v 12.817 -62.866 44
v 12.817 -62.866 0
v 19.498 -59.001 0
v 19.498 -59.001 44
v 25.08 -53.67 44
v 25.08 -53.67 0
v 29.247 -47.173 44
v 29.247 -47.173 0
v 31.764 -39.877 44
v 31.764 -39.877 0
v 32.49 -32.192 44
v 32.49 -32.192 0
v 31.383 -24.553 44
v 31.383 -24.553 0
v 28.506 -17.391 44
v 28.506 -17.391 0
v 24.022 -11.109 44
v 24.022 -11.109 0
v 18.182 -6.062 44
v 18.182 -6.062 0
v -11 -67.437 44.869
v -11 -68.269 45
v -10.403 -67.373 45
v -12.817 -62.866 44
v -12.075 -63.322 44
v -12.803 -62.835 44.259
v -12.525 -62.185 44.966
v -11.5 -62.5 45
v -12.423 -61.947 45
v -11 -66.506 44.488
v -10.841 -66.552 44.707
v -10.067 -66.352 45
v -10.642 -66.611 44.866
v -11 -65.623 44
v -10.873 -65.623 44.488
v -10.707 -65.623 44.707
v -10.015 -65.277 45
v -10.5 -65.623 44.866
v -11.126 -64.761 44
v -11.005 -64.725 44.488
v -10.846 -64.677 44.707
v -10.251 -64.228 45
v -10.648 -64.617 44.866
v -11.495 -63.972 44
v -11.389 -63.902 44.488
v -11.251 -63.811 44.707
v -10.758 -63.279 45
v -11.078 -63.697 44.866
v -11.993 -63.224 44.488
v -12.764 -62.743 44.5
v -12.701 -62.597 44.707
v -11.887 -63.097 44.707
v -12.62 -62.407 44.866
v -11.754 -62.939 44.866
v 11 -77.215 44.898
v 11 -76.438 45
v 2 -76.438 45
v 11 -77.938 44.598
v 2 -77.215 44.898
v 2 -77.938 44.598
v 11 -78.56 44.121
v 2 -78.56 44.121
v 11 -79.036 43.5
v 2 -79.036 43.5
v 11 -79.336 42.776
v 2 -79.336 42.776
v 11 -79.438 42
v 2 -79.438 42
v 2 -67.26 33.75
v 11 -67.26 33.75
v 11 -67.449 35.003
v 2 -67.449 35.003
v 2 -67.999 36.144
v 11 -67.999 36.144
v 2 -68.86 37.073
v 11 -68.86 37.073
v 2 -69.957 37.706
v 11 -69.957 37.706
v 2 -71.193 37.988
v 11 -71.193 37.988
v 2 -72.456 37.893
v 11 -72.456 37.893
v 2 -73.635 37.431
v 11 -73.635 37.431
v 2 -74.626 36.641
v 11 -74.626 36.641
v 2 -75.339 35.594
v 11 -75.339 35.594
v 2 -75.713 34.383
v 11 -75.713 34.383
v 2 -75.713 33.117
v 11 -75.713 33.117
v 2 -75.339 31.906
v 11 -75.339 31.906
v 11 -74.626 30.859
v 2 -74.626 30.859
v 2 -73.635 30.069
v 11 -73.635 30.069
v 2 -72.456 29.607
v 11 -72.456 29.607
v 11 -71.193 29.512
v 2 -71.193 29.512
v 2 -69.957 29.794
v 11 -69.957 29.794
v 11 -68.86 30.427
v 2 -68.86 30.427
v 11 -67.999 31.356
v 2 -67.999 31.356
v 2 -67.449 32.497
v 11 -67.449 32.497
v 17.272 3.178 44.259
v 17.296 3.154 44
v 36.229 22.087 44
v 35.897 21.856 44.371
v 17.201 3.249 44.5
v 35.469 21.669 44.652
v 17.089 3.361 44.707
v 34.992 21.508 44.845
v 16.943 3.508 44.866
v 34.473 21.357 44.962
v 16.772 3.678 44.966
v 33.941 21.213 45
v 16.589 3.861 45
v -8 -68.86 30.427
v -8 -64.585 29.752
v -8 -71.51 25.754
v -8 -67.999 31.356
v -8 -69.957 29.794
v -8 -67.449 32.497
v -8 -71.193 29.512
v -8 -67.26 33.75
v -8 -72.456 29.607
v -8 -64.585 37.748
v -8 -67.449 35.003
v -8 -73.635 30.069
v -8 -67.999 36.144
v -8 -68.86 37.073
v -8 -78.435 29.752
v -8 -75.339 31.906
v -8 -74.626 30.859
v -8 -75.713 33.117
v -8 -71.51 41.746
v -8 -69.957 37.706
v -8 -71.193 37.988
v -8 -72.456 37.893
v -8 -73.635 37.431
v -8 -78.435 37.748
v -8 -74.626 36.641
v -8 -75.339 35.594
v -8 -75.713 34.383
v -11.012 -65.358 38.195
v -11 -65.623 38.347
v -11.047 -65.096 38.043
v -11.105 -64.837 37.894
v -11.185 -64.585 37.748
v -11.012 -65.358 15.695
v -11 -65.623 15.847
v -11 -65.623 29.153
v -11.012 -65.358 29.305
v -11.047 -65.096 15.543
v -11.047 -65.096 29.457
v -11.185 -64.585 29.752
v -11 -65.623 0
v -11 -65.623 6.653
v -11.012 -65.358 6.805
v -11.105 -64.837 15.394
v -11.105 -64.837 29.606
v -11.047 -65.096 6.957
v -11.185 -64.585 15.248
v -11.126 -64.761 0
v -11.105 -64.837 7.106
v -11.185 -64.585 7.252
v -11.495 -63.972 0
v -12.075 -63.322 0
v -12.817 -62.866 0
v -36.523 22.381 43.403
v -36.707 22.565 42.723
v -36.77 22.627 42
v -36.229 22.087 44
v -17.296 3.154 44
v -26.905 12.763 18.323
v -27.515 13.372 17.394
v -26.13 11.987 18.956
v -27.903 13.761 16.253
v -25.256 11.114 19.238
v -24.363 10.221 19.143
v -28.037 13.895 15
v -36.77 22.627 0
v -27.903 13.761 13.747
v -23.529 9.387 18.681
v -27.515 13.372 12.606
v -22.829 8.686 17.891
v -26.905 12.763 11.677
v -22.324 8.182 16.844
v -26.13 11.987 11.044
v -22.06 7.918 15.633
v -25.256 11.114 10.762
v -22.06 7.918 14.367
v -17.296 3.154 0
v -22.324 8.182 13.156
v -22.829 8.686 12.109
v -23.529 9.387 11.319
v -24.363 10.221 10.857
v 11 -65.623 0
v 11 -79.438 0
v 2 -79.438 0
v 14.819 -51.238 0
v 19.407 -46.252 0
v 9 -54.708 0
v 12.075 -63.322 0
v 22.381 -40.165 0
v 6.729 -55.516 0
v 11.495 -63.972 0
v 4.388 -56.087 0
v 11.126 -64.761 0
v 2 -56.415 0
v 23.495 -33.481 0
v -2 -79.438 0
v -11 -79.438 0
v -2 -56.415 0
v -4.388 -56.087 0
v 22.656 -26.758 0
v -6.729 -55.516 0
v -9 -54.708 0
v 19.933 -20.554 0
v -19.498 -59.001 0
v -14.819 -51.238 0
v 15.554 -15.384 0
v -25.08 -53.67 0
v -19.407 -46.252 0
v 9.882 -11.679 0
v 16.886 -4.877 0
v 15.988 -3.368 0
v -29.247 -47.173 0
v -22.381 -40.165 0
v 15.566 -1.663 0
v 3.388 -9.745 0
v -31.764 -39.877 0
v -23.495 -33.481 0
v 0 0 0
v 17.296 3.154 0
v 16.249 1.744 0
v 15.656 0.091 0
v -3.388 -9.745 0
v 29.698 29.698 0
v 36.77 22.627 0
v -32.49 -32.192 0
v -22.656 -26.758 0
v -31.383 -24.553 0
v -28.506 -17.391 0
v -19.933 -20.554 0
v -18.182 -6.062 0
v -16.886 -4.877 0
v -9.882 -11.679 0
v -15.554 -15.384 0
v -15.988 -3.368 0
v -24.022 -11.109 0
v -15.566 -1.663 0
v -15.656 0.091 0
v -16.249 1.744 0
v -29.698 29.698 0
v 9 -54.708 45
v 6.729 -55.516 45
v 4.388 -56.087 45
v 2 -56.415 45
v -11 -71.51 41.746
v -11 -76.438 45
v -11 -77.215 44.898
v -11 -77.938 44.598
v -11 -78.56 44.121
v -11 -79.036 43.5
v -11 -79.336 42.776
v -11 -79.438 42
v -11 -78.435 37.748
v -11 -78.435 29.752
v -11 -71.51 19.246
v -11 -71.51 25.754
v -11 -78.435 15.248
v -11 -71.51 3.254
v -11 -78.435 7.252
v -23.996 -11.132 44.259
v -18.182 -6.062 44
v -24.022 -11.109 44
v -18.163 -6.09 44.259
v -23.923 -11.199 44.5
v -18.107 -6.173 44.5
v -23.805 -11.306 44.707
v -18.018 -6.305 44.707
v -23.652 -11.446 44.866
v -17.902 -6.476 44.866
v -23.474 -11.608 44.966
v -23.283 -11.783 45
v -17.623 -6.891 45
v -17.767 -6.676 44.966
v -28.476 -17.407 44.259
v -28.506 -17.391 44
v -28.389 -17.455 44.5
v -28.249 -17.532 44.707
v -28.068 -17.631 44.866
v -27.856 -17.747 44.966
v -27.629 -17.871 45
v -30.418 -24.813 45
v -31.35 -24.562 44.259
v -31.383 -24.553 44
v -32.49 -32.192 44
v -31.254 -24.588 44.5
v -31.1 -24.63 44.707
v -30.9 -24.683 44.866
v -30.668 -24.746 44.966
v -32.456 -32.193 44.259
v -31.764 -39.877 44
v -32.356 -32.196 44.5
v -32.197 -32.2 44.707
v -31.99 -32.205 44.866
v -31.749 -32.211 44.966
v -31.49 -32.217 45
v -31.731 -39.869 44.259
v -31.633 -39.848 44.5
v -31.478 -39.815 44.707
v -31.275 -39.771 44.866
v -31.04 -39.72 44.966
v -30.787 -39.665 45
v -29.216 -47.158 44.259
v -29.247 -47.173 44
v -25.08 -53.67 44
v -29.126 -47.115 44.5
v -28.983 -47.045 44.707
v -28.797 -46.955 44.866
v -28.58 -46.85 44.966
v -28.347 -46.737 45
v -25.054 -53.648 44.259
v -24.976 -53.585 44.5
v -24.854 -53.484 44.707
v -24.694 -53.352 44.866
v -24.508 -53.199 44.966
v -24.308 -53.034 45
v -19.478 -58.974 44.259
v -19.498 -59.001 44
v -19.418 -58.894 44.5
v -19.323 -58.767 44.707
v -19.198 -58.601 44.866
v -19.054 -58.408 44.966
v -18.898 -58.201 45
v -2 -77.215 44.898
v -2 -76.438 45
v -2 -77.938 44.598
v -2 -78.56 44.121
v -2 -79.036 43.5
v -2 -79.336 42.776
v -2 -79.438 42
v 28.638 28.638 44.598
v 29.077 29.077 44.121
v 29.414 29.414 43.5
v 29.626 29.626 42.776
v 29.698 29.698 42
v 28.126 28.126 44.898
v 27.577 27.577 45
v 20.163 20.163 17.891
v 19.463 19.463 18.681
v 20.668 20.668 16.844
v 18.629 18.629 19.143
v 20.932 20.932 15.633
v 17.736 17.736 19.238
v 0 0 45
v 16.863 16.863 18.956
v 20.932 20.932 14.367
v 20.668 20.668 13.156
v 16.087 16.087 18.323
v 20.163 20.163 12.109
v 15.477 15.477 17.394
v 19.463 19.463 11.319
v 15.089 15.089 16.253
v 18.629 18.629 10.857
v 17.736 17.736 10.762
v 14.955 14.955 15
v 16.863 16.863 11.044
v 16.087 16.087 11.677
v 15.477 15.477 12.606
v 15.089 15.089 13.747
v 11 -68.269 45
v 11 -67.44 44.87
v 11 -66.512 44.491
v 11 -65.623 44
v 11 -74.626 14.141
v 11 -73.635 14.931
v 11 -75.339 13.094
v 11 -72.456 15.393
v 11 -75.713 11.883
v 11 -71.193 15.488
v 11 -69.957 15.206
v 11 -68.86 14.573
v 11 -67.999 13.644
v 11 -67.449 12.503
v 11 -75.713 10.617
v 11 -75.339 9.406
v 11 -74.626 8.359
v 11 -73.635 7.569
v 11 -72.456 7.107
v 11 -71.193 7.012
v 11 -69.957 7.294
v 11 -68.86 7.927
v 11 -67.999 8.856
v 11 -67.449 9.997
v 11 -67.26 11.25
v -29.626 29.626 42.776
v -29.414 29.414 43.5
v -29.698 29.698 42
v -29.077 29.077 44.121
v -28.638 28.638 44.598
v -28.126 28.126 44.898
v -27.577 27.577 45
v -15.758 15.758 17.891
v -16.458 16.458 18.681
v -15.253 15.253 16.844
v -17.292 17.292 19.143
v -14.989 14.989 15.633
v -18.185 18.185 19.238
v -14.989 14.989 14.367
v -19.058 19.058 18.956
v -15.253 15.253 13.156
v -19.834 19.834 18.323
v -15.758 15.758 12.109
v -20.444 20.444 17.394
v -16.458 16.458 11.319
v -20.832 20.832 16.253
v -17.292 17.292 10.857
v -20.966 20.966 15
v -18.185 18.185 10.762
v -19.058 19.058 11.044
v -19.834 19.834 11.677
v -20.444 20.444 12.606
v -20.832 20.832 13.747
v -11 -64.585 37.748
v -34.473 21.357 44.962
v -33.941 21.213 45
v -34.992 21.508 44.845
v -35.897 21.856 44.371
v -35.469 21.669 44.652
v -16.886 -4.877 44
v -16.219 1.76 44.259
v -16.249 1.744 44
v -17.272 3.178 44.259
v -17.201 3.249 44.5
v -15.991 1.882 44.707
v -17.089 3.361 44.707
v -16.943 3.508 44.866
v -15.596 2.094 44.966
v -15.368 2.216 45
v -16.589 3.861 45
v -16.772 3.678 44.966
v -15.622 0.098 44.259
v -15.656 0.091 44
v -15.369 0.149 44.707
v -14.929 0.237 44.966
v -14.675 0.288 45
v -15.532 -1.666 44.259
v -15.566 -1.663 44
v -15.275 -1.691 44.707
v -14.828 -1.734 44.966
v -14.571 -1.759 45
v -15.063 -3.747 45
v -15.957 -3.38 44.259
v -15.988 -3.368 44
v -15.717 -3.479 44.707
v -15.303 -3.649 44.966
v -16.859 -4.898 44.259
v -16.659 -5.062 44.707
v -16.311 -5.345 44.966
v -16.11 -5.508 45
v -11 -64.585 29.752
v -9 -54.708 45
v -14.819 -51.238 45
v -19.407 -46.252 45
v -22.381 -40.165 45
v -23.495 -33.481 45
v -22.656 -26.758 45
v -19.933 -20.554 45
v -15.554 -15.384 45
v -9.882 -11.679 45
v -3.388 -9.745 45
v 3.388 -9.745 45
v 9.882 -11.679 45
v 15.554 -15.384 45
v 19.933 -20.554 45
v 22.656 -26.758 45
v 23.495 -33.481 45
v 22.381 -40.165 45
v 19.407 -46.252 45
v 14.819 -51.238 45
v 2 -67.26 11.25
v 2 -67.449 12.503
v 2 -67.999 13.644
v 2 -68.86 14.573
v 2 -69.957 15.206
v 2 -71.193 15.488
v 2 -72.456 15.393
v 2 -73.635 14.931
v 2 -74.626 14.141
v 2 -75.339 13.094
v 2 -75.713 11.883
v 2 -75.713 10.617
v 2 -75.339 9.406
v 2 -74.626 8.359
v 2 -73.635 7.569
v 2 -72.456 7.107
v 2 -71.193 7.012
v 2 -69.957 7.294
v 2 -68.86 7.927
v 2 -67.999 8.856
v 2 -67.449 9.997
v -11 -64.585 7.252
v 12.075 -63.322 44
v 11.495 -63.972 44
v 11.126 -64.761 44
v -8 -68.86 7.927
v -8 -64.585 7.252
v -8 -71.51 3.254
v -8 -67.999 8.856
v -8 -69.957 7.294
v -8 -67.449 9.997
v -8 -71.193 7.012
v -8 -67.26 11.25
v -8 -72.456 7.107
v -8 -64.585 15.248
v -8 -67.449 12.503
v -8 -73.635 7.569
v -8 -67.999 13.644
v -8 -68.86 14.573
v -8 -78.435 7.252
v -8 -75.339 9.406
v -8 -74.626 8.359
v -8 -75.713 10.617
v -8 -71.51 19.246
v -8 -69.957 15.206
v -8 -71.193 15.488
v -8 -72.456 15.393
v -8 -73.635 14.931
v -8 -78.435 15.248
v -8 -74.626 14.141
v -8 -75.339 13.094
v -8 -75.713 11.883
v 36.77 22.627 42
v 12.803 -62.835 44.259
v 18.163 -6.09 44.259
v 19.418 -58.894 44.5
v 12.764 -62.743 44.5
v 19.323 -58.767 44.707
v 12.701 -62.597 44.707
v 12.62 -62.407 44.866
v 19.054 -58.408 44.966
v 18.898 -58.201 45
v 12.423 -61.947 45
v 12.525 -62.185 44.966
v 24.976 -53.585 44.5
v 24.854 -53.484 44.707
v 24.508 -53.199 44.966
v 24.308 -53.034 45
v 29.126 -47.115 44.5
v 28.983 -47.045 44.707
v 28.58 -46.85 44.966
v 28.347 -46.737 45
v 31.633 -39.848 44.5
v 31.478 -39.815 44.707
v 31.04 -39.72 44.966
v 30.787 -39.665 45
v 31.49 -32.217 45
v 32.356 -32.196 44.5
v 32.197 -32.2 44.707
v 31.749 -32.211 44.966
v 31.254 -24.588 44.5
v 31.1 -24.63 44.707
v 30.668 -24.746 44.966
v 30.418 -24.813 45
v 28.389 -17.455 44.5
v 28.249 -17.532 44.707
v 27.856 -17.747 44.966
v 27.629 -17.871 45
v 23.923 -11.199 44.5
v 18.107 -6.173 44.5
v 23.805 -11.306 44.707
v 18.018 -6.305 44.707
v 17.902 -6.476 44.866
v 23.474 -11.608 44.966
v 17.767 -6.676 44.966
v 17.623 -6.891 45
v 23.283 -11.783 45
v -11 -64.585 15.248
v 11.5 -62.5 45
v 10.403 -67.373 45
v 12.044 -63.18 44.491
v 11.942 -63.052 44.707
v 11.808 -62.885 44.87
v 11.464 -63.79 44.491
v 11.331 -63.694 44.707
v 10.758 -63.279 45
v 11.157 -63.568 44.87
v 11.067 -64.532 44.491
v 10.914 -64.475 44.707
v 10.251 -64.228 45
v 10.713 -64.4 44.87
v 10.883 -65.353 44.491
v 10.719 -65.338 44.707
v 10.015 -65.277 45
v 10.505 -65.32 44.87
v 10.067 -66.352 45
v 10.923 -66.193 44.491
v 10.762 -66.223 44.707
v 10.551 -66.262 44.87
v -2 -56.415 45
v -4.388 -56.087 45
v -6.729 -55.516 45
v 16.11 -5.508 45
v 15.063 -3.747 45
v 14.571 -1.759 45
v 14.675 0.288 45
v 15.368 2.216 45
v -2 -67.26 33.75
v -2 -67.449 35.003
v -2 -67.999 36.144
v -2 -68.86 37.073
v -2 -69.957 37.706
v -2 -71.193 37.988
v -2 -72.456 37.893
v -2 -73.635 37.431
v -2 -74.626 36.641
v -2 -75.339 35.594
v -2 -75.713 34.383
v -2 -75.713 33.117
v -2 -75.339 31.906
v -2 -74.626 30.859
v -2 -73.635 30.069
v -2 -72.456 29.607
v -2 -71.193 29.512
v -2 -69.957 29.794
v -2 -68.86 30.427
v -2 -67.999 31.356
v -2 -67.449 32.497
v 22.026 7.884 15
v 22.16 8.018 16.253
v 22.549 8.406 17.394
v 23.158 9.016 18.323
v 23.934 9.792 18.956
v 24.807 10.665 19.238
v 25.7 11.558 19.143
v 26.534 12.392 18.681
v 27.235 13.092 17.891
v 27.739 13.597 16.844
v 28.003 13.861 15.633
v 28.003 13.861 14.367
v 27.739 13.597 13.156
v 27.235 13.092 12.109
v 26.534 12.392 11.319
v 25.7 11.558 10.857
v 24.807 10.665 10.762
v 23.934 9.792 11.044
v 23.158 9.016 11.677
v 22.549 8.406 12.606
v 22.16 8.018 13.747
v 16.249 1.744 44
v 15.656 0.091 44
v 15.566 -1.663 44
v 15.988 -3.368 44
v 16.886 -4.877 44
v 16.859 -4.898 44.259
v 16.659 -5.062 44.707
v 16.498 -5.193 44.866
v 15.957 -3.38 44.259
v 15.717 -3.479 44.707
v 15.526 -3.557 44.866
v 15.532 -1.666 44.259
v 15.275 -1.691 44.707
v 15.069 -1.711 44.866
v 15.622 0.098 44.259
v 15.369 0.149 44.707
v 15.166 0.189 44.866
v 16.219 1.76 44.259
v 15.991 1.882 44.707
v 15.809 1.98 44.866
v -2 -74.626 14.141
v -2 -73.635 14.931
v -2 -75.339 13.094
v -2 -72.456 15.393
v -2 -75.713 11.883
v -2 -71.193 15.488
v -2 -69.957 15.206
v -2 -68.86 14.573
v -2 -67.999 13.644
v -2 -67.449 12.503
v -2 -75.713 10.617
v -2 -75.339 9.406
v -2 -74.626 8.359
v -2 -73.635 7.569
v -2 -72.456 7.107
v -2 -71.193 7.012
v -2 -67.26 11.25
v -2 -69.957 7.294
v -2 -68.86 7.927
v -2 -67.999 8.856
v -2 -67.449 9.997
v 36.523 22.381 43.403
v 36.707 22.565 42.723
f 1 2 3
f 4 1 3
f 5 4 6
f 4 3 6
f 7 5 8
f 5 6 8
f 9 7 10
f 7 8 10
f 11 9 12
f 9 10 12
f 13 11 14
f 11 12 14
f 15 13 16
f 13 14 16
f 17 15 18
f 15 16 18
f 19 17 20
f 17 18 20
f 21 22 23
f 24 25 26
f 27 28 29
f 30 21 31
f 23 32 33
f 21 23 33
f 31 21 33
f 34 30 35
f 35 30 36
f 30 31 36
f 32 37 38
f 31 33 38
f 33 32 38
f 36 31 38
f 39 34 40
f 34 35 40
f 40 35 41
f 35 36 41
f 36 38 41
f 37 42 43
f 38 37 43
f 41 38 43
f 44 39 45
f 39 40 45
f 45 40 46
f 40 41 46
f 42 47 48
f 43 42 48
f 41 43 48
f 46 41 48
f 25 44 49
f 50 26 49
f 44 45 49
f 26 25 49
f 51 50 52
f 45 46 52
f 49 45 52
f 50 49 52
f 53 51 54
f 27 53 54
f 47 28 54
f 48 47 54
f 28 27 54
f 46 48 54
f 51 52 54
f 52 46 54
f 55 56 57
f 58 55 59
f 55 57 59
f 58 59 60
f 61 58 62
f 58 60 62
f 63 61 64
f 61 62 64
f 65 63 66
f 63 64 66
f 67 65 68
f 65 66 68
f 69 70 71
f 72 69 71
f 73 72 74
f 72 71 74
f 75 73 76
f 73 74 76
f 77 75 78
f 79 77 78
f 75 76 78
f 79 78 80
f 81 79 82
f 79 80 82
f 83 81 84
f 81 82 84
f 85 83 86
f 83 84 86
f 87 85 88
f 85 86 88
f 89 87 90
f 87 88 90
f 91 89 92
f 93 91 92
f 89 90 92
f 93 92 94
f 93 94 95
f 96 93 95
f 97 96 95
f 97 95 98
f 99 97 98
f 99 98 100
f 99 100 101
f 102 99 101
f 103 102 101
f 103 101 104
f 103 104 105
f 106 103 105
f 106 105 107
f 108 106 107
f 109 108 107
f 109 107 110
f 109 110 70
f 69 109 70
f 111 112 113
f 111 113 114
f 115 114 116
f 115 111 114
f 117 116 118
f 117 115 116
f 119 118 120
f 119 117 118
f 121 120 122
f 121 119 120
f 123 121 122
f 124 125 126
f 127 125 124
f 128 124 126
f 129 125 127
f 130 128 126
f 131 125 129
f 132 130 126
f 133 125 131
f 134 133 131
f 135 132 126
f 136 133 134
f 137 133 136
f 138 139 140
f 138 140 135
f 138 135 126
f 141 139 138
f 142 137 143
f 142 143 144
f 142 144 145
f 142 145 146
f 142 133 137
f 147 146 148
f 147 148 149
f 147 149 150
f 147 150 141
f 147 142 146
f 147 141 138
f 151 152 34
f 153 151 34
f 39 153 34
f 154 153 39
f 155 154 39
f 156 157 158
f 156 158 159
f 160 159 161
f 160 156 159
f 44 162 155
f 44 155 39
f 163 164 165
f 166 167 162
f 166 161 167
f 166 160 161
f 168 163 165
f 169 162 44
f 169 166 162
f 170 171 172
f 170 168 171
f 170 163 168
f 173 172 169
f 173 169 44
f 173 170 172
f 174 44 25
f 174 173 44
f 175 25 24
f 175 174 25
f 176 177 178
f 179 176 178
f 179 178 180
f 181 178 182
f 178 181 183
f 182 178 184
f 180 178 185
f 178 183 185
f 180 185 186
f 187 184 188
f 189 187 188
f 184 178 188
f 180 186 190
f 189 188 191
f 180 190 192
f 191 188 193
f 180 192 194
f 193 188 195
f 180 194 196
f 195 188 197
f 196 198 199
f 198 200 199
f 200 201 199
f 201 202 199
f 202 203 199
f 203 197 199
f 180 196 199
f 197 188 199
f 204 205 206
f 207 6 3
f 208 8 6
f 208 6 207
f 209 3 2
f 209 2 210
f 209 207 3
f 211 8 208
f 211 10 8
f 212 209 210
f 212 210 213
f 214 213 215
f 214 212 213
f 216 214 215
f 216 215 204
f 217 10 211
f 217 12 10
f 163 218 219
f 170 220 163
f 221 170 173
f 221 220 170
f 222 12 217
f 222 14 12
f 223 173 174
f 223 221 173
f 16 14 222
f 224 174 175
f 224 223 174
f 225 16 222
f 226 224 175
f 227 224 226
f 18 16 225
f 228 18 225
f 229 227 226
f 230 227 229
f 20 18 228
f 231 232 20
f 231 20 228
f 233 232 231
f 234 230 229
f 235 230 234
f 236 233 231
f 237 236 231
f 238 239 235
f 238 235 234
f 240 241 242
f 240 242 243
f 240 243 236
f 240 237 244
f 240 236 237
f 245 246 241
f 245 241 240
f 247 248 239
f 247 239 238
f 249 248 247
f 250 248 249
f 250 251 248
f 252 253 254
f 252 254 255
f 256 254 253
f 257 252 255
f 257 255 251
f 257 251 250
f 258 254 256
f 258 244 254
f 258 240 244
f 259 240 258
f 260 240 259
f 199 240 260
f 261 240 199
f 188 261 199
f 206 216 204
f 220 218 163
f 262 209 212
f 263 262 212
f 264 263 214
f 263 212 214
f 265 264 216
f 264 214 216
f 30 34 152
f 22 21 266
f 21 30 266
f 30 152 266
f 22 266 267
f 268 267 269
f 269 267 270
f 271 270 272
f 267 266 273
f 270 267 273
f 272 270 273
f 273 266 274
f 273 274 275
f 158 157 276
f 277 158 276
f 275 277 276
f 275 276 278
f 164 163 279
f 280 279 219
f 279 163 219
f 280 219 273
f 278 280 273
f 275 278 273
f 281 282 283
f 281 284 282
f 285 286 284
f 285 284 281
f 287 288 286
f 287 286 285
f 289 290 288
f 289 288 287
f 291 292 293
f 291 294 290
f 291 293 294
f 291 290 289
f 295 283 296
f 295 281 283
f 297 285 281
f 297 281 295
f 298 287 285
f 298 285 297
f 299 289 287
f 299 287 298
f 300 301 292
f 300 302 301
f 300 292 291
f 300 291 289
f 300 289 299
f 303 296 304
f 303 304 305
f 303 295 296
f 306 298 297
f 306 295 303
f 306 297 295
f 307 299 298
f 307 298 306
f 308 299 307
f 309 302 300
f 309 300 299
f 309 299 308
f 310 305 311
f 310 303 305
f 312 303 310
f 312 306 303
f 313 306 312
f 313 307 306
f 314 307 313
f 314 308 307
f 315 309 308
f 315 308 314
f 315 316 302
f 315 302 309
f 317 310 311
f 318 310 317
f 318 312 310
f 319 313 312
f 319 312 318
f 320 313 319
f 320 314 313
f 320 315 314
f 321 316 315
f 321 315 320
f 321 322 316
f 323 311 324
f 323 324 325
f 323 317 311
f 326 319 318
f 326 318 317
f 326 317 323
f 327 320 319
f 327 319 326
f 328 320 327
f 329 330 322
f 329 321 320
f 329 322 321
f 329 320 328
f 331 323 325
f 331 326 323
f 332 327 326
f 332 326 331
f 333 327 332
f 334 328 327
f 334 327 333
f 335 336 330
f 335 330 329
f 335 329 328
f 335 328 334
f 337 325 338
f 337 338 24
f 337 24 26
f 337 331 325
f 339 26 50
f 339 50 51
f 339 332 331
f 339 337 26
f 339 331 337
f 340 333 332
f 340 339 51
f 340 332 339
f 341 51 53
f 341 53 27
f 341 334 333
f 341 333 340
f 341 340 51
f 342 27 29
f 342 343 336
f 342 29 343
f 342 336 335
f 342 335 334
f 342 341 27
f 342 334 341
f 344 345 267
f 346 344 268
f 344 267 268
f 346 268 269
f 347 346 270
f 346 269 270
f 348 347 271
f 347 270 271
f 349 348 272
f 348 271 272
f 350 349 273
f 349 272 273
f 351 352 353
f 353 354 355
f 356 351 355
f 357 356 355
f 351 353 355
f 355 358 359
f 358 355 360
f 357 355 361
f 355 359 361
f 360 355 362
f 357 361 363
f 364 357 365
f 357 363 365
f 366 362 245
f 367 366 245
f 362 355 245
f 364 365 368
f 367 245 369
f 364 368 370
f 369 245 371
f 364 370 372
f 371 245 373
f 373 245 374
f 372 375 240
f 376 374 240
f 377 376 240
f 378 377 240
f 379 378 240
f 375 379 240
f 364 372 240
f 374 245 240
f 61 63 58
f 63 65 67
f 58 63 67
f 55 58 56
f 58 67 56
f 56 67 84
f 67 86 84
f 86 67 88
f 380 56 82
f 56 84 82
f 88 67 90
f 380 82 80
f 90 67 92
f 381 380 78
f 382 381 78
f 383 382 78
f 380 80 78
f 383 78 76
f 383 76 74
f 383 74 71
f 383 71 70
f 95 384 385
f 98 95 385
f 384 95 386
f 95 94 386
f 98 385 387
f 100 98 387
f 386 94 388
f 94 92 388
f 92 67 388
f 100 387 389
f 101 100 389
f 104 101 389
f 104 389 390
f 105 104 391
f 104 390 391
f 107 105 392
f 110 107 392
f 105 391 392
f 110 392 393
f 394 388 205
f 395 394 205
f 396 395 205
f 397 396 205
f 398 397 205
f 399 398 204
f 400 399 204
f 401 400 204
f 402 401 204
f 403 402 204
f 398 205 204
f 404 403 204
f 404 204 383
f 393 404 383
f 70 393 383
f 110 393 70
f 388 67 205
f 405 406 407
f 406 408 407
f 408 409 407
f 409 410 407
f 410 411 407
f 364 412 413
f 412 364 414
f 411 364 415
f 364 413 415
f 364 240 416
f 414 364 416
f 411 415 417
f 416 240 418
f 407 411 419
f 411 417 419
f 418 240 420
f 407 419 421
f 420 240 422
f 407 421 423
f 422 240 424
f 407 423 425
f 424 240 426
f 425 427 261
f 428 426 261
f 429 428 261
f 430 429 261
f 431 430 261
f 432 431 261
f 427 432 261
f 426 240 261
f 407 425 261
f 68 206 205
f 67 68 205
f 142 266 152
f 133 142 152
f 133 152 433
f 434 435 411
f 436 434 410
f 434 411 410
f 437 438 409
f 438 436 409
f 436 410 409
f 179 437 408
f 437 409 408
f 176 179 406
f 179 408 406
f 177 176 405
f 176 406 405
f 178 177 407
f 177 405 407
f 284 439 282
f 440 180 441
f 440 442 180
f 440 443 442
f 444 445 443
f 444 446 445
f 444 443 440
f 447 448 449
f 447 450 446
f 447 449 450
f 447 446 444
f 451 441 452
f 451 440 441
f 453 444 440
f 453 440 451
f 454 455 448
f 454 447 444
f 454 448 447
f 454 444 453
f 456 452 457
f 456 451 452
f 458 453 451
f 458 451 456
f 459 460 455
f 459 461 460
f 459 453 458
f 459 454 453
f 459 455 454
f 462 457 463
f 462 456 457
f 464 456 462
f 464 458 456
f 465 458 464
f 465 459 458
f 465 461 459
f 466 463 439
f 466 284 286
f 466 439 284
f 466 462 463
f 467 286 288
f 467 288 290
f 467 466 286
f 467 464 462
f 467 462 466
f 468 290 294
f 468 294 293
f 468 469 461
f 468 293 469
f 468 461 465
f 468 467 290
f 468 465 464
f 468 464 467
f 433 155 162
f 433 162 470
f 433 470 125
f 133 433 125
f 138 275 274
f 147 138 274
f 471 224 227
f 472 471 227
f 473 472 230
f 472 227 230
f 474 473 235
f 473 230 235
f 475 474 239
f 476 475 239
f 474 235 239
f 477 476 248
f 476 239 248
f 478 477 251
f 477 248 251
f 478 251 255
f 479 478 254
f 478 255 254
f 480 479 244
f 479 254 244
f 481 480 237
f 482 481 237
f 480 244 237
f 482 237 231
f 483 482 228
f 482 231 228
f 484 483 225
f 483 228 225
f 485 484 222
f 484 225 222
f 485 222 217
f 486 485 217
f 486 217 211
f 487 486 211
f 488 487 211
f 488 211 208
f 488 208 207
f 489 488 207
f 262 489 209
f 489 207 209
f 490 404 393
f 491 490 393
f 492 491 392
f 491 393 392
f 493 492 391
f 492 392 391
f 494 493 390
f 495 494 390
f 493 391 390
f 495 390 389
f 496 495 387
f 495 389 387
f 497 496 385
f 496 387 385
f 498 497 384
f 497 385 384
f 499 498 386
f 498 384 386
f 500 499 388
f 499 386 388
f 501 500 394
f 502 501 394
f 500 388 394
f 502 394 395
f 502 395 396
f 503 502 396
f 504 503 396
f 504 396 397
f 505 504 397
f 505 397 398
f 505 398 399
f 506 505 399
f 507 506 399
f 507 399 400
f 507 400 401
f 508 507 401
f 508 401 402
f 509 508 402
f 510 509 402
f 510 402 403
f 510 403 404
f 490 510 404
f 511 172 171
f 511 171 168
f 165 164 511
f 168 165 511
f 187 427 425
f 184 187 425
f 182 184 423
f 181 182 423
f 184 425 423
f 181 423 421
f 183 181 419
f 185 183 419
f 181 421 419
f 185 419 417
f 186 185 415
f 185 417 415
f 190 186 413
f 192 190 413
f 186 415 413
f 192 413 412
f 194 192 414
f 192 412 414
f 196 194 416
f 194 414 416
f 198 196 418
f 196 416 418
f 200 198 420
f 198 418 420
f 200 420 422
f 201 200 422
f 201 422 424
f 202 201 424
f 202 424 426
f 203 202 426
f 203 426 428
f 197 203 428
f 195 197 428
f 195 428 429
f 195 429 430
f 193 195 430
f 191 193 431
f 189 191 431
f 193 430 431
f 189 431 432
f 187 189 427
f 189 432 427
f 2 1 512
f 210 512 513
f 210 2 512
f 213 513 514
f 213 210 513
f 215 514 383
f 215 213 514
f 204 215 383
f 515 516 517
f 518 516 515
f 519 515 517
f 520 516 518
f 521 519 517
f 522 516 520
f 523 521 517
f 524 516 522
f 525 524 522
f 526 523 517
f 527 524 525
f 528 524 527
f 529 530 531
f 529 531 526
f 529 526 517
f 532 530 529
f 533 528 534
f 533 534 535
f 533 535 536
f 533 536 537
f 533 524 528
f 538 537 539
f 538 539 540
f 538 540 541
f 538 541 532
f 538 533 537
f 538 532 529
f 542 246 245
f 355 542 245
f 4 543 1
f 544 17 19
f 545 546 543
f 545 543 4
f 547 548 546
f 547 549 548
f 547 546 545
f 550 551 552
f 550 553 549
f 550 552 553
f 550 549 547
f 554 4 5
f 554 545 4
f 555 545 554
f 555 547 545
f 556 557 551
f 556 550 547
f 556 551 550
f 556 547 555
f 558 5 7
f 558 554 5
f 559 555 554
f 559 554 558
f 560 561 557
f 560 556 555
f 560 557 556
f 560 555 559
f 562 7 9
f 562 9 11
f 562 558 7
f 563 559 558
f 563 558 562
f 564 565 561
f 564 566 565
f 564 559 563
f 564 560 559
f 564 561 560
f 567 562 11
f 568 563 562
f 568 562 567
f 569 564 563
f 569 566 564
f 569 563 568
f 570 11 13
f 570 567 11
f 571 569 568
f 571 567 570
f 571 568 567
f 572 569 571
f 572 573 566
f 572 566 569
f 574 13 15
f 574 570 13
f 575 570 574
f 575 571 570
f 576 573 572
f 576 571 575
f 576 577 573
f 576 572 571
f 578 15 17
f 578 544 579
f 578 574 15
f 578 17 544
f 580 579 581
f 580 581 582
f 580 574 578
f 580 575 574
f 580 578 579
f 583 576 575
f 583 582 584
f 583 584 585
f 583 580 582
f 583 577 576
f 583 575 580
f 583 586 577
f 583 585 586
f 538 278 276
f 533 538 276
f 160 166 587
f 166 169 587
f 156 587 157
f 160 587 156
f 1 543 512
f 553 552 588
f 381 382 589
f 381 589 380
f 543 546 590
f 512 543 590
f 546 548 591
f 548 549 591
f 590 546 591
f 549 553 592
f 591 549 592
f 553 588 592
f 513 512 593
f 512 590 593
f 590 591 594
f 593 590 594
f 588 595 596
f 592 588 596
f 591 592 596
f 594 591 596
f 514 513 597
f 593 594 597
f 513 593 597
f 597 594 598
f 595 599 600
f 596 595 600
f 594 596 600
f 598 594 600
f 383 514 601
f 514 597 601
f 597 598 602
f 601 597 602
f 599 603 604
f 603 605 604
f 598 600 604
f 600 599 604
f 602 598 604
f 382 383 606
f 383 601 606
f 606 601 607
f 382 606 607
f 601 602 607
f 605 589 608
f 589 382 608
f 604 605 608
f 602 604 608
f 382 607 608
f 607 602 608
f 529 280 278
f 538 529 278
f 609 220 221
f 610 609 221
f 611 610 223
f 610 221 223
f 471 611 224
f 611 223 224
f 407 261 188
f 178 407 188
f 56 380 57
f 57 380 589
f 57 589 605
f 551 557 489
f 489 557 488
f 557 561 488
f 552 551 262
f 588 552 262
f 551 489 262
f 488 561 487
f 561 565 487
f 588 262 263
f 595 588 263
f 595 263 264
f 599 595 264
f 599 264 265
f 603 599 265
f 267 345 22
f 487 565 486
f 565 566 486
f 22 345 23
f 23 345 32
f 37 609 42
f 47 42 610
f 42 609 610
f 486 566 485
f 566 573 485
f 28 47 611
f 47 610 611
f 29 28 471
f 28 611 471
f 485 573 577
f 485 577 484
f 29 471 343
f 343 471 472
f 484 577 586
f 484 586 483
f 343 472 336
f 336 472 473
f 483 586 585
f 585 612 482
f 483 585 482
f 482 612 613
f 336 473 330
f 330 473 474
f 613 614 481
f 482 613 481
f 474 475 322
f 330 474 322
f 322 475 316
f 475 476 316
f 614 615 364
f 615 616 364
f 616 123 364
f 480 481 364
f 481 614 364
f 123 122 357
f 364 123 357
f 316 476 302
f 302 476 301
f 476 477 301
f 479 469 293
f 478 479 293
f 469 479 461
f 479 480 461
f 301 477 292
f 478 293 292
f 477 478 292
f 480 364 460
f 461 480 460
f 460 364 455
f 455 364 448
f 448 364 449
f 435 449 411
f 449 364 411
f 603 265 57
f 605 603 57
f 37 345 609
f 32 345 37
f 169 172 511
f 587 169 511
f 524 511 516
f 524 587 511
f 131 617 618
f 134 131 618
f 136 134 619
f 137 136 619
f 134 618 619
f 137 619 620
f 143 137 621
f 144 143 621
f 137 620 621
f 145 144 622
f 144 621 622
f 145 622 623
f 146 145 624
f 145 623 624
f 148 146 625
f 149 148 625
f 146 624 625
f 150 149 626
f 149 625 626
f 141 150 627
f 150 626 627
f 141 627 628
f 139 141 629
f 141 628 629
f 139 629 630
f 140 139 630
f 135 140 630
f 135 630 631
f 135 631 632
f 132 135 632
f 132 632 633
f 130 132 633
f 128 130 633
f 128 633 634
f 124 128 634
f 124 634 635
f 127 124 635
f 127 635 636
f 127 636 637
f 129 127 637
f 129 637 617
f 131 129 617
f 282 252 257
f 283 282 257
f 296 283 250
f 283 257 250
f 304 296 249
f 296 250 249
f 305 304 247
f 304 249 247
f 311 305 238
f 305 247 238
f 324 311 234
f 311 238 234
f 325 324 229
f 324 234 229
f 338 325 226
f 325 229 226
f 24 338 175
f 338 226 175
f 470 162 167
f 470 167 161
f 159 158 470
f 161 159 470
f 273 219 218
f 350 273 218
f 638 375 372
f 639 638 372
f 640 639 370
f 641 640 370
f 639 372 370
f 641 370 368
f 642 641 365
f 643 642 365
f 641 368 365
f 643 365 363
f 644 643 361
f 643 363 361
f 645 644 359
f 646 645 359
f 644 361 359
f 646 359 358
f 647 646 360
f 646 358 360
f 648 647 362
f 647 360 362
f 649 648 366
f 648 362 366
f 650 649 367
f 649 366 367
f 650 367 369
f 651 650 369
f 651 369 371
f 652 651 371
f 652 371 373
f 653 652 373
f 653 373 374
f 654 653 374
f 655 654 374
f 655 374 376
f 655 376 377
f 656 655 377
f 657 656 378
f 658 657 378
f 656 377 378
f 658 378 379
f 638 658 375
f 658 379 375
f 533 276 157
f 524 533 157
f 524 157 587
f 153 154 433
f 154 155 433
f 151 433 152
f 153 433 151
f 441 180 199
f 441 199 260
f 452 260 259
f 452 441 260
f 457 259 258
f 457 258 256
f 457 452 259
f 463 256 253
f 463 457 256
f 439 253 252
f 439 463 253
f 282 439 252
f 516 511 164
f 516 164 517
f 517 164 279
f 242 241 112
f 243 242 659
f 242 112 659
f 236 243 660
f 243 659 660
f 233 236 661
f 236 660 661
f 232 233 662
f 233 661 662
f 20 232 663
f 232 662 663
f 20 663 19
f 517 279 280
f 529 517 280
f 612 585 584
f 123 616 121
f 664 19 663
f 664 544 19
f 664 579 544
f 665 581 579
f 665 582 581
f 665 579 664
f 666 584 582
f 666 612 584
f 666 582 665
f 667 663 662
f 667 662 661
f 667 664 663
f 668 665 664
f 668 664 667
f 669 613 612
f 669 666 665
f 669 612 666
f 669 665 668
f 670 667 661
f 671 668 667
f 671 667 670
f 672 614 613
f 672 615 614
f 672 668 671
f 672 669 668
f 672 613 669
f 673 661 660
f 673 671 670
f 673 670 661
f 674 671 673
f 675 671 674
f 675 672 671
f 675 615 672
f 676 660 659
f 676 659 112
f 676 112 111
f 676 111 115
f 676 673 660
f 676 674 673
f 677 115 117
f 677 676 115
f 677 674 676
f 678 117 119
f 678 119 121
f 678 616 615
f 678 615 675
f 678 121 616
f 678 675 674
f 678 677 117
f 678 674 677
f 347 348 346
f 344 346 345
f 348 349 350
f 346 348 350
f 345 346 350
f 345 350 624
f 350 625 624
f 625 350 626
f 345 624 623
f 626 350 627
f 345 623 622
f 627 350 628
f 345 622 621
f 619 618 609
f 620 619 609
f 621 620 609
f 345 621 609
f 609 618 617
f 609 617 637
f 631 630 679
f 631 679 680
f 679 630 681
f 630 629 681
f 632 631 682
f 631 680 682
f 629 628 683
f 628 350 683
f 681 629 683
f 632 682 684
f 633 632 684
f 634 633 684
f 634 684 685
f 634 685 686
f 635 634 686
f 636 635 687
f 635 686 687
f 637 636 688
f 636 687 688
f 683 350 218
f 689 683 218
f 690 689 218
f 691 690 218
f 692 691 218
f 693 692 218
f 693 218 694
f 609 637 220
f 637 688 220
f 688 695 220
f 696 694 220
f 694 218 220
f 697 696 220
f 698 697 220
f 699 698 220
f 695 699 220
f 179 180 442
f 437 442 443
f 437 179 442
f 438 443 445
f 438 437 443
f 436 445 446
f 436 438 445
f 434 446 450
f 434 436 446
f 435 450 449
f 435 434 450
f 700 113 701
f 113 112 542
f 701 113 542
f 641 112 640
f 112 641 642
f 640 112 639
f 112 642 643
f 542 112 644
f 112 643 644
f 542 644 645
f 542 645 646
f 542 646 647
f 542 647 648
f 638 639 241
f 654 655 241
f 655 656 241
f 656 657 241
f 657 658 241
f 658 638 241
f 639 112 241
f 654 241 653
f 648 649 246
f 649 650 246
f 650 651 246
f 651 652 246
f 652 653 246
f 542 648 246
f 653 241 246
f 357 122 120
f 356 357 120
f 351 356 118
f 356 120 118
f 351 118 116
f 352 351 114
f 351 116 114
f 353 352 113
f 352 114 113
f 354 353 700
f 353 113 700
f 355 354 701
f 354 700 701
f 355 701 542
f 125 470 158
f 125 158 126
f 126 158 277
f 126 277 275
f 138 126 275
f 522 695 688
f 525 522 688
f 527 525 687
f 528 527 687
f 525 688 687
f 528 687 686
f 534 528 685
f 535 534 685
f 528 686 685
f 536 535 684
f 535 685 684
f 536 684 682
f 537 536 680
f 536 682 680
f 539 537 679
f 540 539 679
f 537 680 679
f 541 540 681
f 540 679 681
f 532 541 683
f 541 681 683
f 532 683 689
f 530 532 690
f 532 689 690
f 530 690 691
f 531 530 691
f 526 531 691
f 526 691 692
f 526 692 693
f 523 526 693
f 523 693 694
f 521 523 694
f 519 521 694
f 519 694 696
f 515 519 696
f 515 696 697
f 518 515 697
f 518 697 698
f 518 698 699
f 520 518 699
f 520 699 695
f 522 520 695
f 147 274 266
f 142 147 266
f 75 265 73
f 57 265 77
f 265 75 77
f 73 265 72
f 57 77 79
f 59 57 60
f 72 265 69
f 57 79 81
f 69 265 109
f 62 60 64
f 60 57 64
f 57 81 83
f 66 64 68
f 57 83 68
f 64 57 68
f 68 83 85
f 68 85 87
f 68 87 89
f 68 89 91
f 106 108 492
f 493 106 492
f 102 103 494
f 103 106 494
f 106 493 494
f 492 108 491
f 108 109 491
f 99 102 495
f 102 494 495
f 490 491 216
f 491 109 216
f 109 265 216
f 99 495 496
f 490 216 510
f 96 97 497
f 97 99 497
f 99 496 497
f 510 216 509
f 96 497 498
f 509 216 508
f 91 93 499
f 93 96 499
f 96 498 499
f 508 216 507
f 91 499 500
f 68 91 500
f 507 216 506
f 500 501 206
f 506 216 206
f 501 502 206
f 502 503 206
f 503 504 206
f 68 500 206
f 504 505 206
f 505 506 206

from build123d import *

# Parameters (mm, degrees)
F1_DEPTH      = 45
F2_R          = 4.25
F3_DEPTH      = 10
F4_R          = 4.25
F5_DEPTH      = 10
F6_R          = 4.25
F7_DEPTH      = 22
F9_DEPTH      = 3
F10_R         = 6
F11_T1_DEPTH  = 45
F11_T6_DEPTH  = 50.1024684741
F11_T11_DEPTH = 50.1024684741
F11_T17_DEPTH = 55.2049369483
F11_T23_DEPTH = 50.1024684741
F11_T25_DEPTH = 24
F11_T27_DEPTH = 24
F11_T29_DEPTH = 25
F11_T31_DEPTH = 25
F12_T3_ANGLE  = 122.7559288298
F12_T6_ANGLE  = 114.5305881861
F12_T9_ANGLE  = 100.9823800972
F12_T12_DEPTH = 27.0396198775
F12_T15_DEPTH = 27.0396198775
F12_T18_ANGLE = 100.9823800972
F12_T21_ANGLE = 114.5305881861
F12_T24_ANGLE = 122.7559288298


# Not quite as in the source:
# - a fillet or chamfer that OpenCascade refuses, or shapes differently, is made with other operations: its cross-section is extruded or revolved along the edge and cut away or added


with BuildPart() as f1:
    # F0 (on Top) → F1 (new body)
    with BuildSketch(Plane.XY):
        with BuildLine():
            Line((29.6984848098, 29.6984848098), (0, 0))
            Line((0, 0), (-29.6984848098, 29.6984848098))
            Line((-29.6984848098, 29.6984848098), (-36.7695526217, 22.627416998))
            Line((-36.7695526217, 22.627416998), (-11.5286496808, -2.613485943))
            ThreePointArc((-11.5286496808, -2.613485943), (-32.4987783251, -33.2817931394), (-11, -63.5818573667))
            ThreePointArc((-11, -63.5818573667), (-8.6210949019, -64.3357100238), (-6.1913611889, -64.9048122801))
            Line((-6.1913611889, -64.9048122801), (-9, -54.7082933461))
            ThreePointArc((-9, -54.7082933461), (0, -9.5), (9, -54.7082933461))
            Line((9, -54.7082933461), (6.1913611889, -64.9048122801))
            ThreePointArc((6.1913611889, -64.9048122801), (8.6210949019, -64.3357100238), (11, -63.5818573667))
            ThreePointArc((11, -63.5818573667), (32.4987783251, -33.2817931394), (11.5286496808, -2.613485943))
            Line((11.5286496808, -2.613485943), (36.7695526217, 22.627416998))
            Line((36.7695526217, 22.627416998), (29.6984848098, 29.6984848098))
        make_face()
        with BuildLine():
            ThreePointArc((-6.1913611889, -64.9048122801), (-8.6210949019, -64.3357100238), (-11, -63.5818573667))
            Line((-11, -63.5818573667), (-11, -79.4384031666))
            Line((-11, -79.4384031666), (-2, -79.4384031666))
            Line((-2, -79.4384031666), (-2, -67.4147389479))
            Line((-2, -67.4147389479), (-5.5, -67.4147389479))
            Line((-5.5, -67.4147389479), (-6.1913611889, -64.9048122801))
        make_face()
        with BuildLine():
            Line((11, -79.4384031666), (11, -63.5818573667))
            ThreePointArc((11, -63.5818573667), (8.6210949019, -64.3357100238), (6.1913611889, -64.9048122801))
            Line((6.1913611889, -64.9048122801), (5.5, -67.4147389479))
            Line((5.5, -67.4147389479), (2, -67.4147389479))
            Line((2, -67.4147389479), (2, -79.4384031666))
            Line((2, -79.4384031666), (11, -79.4384031666))
        make_face()
        with BuildLine():
            Line((-9, -54.7082933461), (-6.1913611889, -64.9048122801))
            ThreePointArc((-6.1913611889, -64.9048122801), (-4.1043610148, -65.2397925034), (-2, -65.4384031666))
            Line((-2, -65.4384031666), (-2, -56.4147389479))
            ThreePointArc((-2, -56.4147389479), (-5.565787379, -55.8313821494), (-9, -54.7082933461))
        make_face()
        with BuildLine():
            ThreePointArc((2, -65.4384031666), (4.1043610148, -65.2397925034), (6.1913611889, -64.9048122801))
            Line((6.1913611889, -64.9048122801), (9, -54.7082933461))
            ThreePointArc((9, -54.7082933461), (5.565787379, -55.8313821494), (2, -56.4147389479))
            Line((2, -56.4147389479), (2, -65.4384031666))
        make_face()
        with BuildLine():
            ThreePointArc((-2, -65.4384031666), (-4.1043610148, -65.2397925034), (-6.1913611889, -64.9048122801))
            Line((-6.1913611889, -64.9048122801), (-5.5, -67.4147389479))
            Line((-5.5, -67.4147389479), (-2, -67.4147389479))
            Line((-2, -67.4147389479), (-2, -65.4384031666))
        make_face()
        with BuildLine():
            Line((5.5, -67.4147389479), (6.1913611889, -64.9048122801))
            ThreePointArc((6.1913611889, -64.9048122801), (4.1043610148, -65.2397925034), (2, -65.4384031666))
            Line((2, -65.4384031666), (2, -67.4147389479))
            Line((2, -67.4147389479), (5.5, -67.4147389479))
        make_face()
    extrude(amount=F1_DEPTH)

    # F2 (on face) → F3 (cut, through all)
    with BuildSketch(Plane(origin=(0, 0, 0), x_dir=(-0.7071067812, -0.7071067812, 0), z_dir=(-0.7071067812, 0.7071067812, 0))):
        with Locations((-25.4, 15)):
            Circle(F2_R)
    extrude(amount=-F3_DEPTH, mode=Mode.SUBTRACT)

    # F4 (on face) → F5 (cut, through all)
    with BuildSketch(Plane(origin=(0, 0, 0), x_dir=(-0.7071067812, 0.7071067812, 0), z_dir=(0.7071067812, 0.7071067812, 0))):
        with Locations((25.4, 15)):
            Circle(F4_R)
    extrude(amount=-F5_DEPTH, mode=Mode.SUBTRACT)

    # F6 (on face) → F7 (cut, through all)
    with BuildSketch(Plane.YZ.offset(11)):
        with Locations((-71.5101302667, 33.75)):
            Circle(F6_R)
        with Locations((-71.5101302667, 11.25)):
            Circle(F6_R)
    extrude(amount=-F7_DEPTH, mode=Mode.SUBTRACT)

    # F8 (on face) → F9 (cut)
    with BuildSketch(Plane(origin=(-11, 0, 0), x_dir=(0, -1, 0), z_dir=(-1, 0, 0))):
        Polygon((78.4351302667, 37.7481506141), (71.5101302667, 41.7463012283), (64.5851302667, 37.7481506141), (64.5851302667, 29.7518493859), (71.5101302667, 25.7536987717), (78.4351302667, 29.7518493859), align=None)
        Polygon((71.5101302667, 19.2463012283), (64.5851302667, 15.2481506141), (64.5851302667, 7.2518493859), (71.5101302667, 3.2536987717), (78.4351302667, 7.2518493859), (78.4351302667, 15.2481506141), align=None)
    extrude(amount=-F9_DEPTH, mode=Mode.SUBTRACT)

    # F10
    f10_edges = [f1.edges().sort_by_distance(p)[0] for p in [
        (-11.52865, -2.613486, 22.5),
        (11.52865, -2.613486, 22.5),
    ]]
    fillet(f10_edges, radius=F10_R)

    # F11: fillet of radius 3 on 6 edges, made by hand

    # F11_s2 → F11_t1 (join)
    with BuildSketch(Plane.XY):
        with BuildLine():
            ThreePointArc((12.8169014085, -62.8659846361), (11.4950752731, -63.9719807061), (11, -65.6228447564))
            Line((11, -65.6228447564), (11, -63.5818573667))
            ThreePointArc((11, -63.5818573667), (11.9138287975, -63.2375707256), (12.8169014085, -62.8659846361))
        make_face()
    extrude(amount=F11_T1_DEPTH)


with BuildPart() as f11_tool4:
    # F11_s5 → F11_t6 (new body)
    with BuildSketch(Plane.XY):
        with BuildLine():
            ThreePointArc((-11, -65.6228447564), (-11.4950752731, -63.9719807061), (-12.8169014085, -62.8659846361))
            ThreePointArc((-12.8169014085, -62.8659846361), (-11.9138287975, -63.2375707256), (-11, -63.5818573667))
            Line((-11, -63.5818573667), (-11, -65.6228447564))
        make_face()
    extrude(amount=F11_T6_DEPTH)

    split(bisect_by=Plane(origin=(0, -19.286425463, 33.4050687982), x_dir=(1, 0, 0), z_dir=(0, 0.5, -0.8660254038)), keep=Keep.TOP)


with BuildPart() as f1_1:
    add(f1.part)

    # F11_t3: union F11_tool4
    add(f11_tool4.part)


with BuildPart() as f11_tool9:
    # F11_s10 → F11_t11 (new body)
    with BuildSketch(Plane.XY.offset(-5.1024684741)):
        with BuildLine():
            ThreePointArc((-11, -65.6228447564), (-11.4950752731, -63.9719807061), (-12.8169014085, -62.8659846361))
            ThreePointArc((-12.8169014085, -62.8659846361), (-11.9138287975, -63.2375707256), (-11, -63.5818573667))
            Line((-11, -63.5818573667), (-11, -65.6228447564))
        make_face()
    extrude(amount=F11_T11_DEPTH)

    split(bisect_by=Plane.XZ.offset(64.5851302667), keep=Keep.BOTTOM)

    split(bisect_by=Plane(origin=(0, -19.286425463, 33.4050687982), x_dir=(1, 0, 0), z_dir=(0, -0.5, 0.8660254038)), keep=Keep.TOP)


with BuildPart() as f1_2:
    add(f1_1.part)

    # F11_t8: union F11_tool9
    add(f11_tool9.part)


with BuildPart() as f11_tool15:
    # F11_s16 → F11_t17 (new body)
    with BuildSketch(Plane.XY.offset(-5.1024684741)):
        with BuildLine():
            ThreePointArc((-11, -65.6228447564), (-11.4950752731, -63.9719807061), (-12.8169014085, -62.8659846361))
            ThreePointArc((-12.8169014085, -62.8659846361), (-11.9138287975, -63.2375707256), (-11, -63.5818573667))
            Line((-11, -63.5818573667), (-11, -65.6228447564))
        make_face()
    extrude(amount=F11_T17_DEPTH)

    split(bisect_by=Plane(origin=(0, -29.0292112555, 50.2800687982), x_dir=(1, 0, 0), z_dir=(0, 0.5, -0.8660254038)), keep=Keep.TOP)

    split(bisect_by=Plane(origin=(0, -9.5436396704, -16.5300687982), x_dir=(1, 0, 0), z_dir=(0, 0.5, 0.8660254038)), keep=Keep.TOP)


with BuildPart() as f1_3:
    add(f1_2.part)

    # F11_t14: union F11_tool15
    add(f11_tool15.part)


with BuildPart() as f11_tool21:
    # F11_s22 → F11_t23 (new body)
    with BuildSketch(Plane.XY.offset(-5.1024684741)):
        with BuildLine():
            ThreePointArc((-11, -65.6228447564), (-11.4950752731, -63.9719807061), (-12.8169014085, -62.8659846361))
            ThreePointArc((-12.8169014085, -62.8659846361), (-11.9138287975, -63.2375707256), (-11, -63.5818573667))
            Line((-11, -63.5818573667), (-11, -65.6228447564))
        make_face()
    extrude(amount=F11_T23_DEPTH)

    split(bisect_by=Plane(origin=(0, 0.1991461222, 0.3449312018), x_dir=(1, 0, 0), z_dir=(0, 0.5, 0.8660254038)), keep=Keep.TOP)


with BuildPart() as f1_4:
    add(f1_3.part)

    # F11_t20: union F11_tool21
    add(f11_tool21.part)

    # F11_s26 → F11_t25 (cut)
    with BuildSketch(Plane.YZ.offset(-18.5)):
        with BuildLine():
            ThreePointArc((-76.4384031666, 45), (-78.5597235102, 44.1213203436), (-79.4384031666, 42))
            Line((-79.4384031666, 42), (-79.4384031666, 45))
            Line((-79.4384031666, 45), (-76.4384031666, 45))
        make_face()
    extrude(amount=F11_T25_DEPTH, mode=Mode.SUBTRACT)

    # F11_s28 → F11_t27 (cut)
    with BuildSketch(Plane.YZ.offset(-5.5)):
        with BuildLine():
            ThreePointArc((-76.4384031666, 45), (-78.5597235102, 44.1213203436), (-79.4384031666, 42))
            Line((-79.4384031666, 42), (-79.4384031666, 45))
            Line((-79.4384031666, 45), (-76.4384031666, 45))
        make_face()
    extrude(amount=F11_T27_DEPTH, mode=Mode.SUBTRACT)

    # F11_s30 → F11_t29 (cut)
    with BuildSketch(Plane(origin=(5.3033008589, 5.3033008589, 0), x_dir=(0, 0, 1), z_dir=(-0.7071067812, -0.7071067812, 0))):
        with BuildLine():
            ThreePointArc((45, 39), (44.1213203436, 41.1213203436), (42, 42))
            Line((42, 42), (45, 42))
            Line((45, 42), (45, 39))
        make_face()
    extrude(amount=F11_T29_DEPTH, mode=Mode.SUBTRACT)

    # F11_s32 → F11_t31 (cut)
    with BuildSketch(Plane(origin=(12.3743686708, -12.3743686708, 0), x_dir=(0, 0, 1), z_dir=(-0.7071067812, 0.7071067812, 0))):
        with BuildLine():
            ThreePointArc((45, 39), (44.1213203436, 41.1213203436), (42, 42))
            Line((42, 42), (45, 42))
            Line((45, 42), (45, 39))
        make_face()
    extrude(amount=F11_T31_DEPTH, mode=Mode.SUBTRACT)

    # F12: fillet of radius 1 on 8 edges, made by hand


with BuildPart() as f12_tool1:
    # F12_s2 → F12_t3 (revolve)
    with BuildSketch(Plane(origin=(-11.9593368598, -5.1323150169, 0), x_dir=(0, 0, 1), z_dir=(-0.9189533734, -0.3943661972, 0))):
        with BuildLine():
            ThreePointArc((44, -62.8254613228), (44.7071067812, -62.532568104), (45, -61.8254613228))
            Line((45, -61.8254613228), (45, -62.8254613228))
            Line((45, -62.8254613228), (44, -62.8254613228))
        make_face()
    revolve(axis=Axis((0, -33, 45), (0, 0, 1)), revolution_arc=F12_T3_ANGLE)


with BuildPart() as f12_tool4:
    # F12_s5 → F12_t6 (revolve)
    with BuildSketch(Plane(origin=(-11.9593368593, -5.1323150166, 0), x_dir=(0, 0, 1), z_dir=(0.9189533734, 0.3943661972, 0))):
        with BuildLine():
            ThreePointArc((44, 62.8254613229), (44.7071067812, 62.5325681041), (45, 61.8254613229))
            Line((45, 61.8254613229), (45, 62.8254613229))
            Line((45, 62.8254613229), (44, 62.8254613229))
        make_face()
    revolve(axis=Axis((14, -65.6228447564, 45), (0, 0, 1)), revolution_arc=F12_T6_ANGLE)


with BuildPart() as f12_tool7:
    # F12_s8 → F12_t9 (revolve)
    with BuildSketch(Plane(origin=(-10.2250328431, 10.2250328431, 0), x_dir=(0, 0, 1), z_dir=(-0.7071067812, 0.7071067812, 0))):
        with BuildLine():
            ThreePointArc((44, -10), (44.7071067812, -9.7071067812), (45, -9))
            Line((45, -9), (45, -10))
            Line((45, -10), (44, -10))
        make_face()
    revolve(axis=Axis((-21.5387413421, -1.0886756559, 45), (0, 0, -1)), revolution_arc=F12_T9_ANGLE)


with BuildPart() as f12_tool10:
    # F12_s11 → F12_t12 (new body)
    with BuildSketch(Plane(origin=(-29.3449314192, 29.3449314192, 0), x_dir=(0, 0, 1), z_dir=(0.7071067812, -0.7071067812, 0))):
        with BuildLine():
            ThreePointArc((44, 10), (44.7071067812, 9.7071067812), (45, 9))
            Line((45, 9), (45, 10))
            Line((45, 10), (44, 10))
        make_face()
    extrude(amount=F12_T12_DEPTH)


with BuildPart() as f12_tool13:
    # F12_s14 → F12_t15 (new body)
    with BuildSketch(Plane(origin=(10.2250328431, 10.2250328431, 0), x_dir=(0, 0, 1), z_dir=(0.7071067812, 0.7071067812, 0))):
        with BuildLine():
            ThreePointArc((44, 10), (44.7071067812, 9.7071067812), (45, 9))
            Line((45, 9), (45, 10))
            Line((45, 10), (44, 10))
        make_face()
    extrude(amount=F12_T15_DEPTH)


with BuildPart() as f12_tool16:
    # F12_s17 → F12_t18 (revolve)
    with BuildSketch(Plane(origin=(15.3023323399, -10.32840175, 0), x_dir=(0, 0, 1), z_dir=(0.8288655674, -0.5594478271, 0))):
        with BuildLine():
            ThreePointArc((44, -5.1474362764), (44.7071067812, -4.8545430576), (45, -4.1474362764))
            Line((45, -4.1474362764), (45, -5.1474362764))
            Line((45, -5.1474362764), (44, -5.1474362764))
        make_face()
    revolve(axis=Axis((21.5387413421, -1.0886756559, 45), (0, 0, -1)), revolution_arc=F12_T18_ANGLE)


with BuildPart() as f12_tool19:
    # F12_s20 → F12_t21 (revolve)
    with BuildSketch(Plane(origin=(-40.3322237445, -36.6261699102, 0), x_dir=(0, 0, 1), z_dir=(-0.74030073, -0.672275858, 0))):
        with BuildLine():
            ThreePointArc((44, -42.1687778654), (44.7071067812, -42.4616710842), (45, -43.1687778654))
            Line((45, -43.1687778654), (45, -42.1687778654))
            Line((45, -42.1687778654), (44, -42.1687778654))
        make_face()
    revolve(axis=Axis((-14, -65.6228447564, 45), (0, 0, 1)), revolution_arc=F12_T21_ANGLE)


with BuildPart() as f12_tool22:
    # F12_s23 → F12_t24 (revolve)
    with BuildSketch(Plane(origin=(-15.3023323399, -10.32840175, 0), x_dir=(0, 0, 1), z_dir=(0.8288655674, 0.5594478271, 0))):
        with BuildLine():
            ThreePointArc((44, -5.1474362764), (44.7071067812, -4.8545430576), (45, -4.1474362764))
            Line((45, -4.1474362764), (45, -5.1474362764))
            Line((45, -5.1474362764), (44, -5.1474362764))
        make_face()
    revolve(axis=Axis((0, -33, 45), (0, 0, 1)), revolution_arc=F12_T24_ANGLE)


with BuildPart() as f1_5:
    add(f1_4.part)

    # F12_t25: cut F12_tool1, F12_tool4, F12_tool7, F12_tool10, F12_tool13, F12_tool16, F12_tool19, F12_tool22
    add([f12_tool1.part, f12_tool4.part, f12_tool7.part, f12_tool10.part, f12_tool13.part, f12_tool16.part, f12_tool19.part, f12_tool22.part], mode=Mode.SUBTRACT)


solid = f1_5.part
